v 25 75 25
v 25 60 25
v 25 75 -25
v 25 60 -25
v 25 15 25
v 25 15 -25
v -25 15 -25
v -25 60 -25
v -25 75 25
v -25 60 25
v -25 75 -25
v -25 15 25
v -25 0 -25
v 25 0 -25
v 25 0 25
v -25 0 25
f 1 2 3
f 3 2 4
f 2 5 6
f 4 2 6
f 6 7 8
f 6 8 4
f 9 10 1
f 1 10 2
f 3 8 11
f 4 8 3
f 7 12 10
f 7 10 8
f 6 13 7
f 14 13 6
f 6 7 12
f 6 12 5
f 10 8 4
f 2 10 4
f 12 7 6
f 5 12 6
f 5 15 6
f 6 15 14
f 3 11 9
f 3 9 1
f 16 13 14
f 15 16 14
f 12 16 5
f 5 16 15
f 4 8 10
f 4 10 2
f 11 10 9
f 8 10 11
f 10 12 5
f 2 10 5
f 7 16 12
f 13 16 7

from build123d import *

# Parameters (mm, degrees)
SKETCH2_W           = 50
SKETCH2_H           = 50
BOSS_EXTRUDE1_DEPTH = 15
BOSS_EXTRUDE2_START = 15
SKETCH2_2_W         = 50
SKETCH2_2_H         = 50
BOSS_EXTRUDE2_DEPTH = 45
BOSS_EXTRUDE3_START = 60
SKETCH2_3_W         = 50
SKETCH2_3_H         = 50
BOSS_EXTRUDE3_DEPTH = 15


with BuildPart() as part:
    # Sketch2 → Boss-Extrude1 (new body)
    with BuildSketch(Plane(origin=(0, 0, 0), x_dir=(1, 0, 0), z_dir=(0, 1, 0))):
        Rectangle(SKETCH2_W, SKETCH2_H)
    extrude(amount=BOSS_EXTRUDE1_DEPTH)


with BuildPart() as body_2:
    # Sketch2<2> → Boss-Extrude2 (new body)
    with BuildSketch(Plane(origin=(0, 0, 0), x_dir=(1, 0, 0), z_dir=(0, 1, 0)).offset(BOSS_EXTRUDE2_START)):
        Rectangle(SKETCH2_2_W, SKETCH2_2_H)
    extrude(amount=BOSS_EXTRUDE2_DEPTH)


with BuildPart() as body_3:
    # Sketch2<3> → Boss-Extrude3 (new body)
    with BuildSketch(Plane(origin=(0, 0, 0), x_dir=(1, 0, 0), z_dir=(0, 1, 0)).offset(BOSS_EXTRUDE3_START)):
        Rectangle(SKETCH2_3_W, SKETCH2_3_H)
    extrude(amount=BOSS_EXTRUDE3_DEPTH)


solid = Compound([part.part, body_2.part, body_3.part])
